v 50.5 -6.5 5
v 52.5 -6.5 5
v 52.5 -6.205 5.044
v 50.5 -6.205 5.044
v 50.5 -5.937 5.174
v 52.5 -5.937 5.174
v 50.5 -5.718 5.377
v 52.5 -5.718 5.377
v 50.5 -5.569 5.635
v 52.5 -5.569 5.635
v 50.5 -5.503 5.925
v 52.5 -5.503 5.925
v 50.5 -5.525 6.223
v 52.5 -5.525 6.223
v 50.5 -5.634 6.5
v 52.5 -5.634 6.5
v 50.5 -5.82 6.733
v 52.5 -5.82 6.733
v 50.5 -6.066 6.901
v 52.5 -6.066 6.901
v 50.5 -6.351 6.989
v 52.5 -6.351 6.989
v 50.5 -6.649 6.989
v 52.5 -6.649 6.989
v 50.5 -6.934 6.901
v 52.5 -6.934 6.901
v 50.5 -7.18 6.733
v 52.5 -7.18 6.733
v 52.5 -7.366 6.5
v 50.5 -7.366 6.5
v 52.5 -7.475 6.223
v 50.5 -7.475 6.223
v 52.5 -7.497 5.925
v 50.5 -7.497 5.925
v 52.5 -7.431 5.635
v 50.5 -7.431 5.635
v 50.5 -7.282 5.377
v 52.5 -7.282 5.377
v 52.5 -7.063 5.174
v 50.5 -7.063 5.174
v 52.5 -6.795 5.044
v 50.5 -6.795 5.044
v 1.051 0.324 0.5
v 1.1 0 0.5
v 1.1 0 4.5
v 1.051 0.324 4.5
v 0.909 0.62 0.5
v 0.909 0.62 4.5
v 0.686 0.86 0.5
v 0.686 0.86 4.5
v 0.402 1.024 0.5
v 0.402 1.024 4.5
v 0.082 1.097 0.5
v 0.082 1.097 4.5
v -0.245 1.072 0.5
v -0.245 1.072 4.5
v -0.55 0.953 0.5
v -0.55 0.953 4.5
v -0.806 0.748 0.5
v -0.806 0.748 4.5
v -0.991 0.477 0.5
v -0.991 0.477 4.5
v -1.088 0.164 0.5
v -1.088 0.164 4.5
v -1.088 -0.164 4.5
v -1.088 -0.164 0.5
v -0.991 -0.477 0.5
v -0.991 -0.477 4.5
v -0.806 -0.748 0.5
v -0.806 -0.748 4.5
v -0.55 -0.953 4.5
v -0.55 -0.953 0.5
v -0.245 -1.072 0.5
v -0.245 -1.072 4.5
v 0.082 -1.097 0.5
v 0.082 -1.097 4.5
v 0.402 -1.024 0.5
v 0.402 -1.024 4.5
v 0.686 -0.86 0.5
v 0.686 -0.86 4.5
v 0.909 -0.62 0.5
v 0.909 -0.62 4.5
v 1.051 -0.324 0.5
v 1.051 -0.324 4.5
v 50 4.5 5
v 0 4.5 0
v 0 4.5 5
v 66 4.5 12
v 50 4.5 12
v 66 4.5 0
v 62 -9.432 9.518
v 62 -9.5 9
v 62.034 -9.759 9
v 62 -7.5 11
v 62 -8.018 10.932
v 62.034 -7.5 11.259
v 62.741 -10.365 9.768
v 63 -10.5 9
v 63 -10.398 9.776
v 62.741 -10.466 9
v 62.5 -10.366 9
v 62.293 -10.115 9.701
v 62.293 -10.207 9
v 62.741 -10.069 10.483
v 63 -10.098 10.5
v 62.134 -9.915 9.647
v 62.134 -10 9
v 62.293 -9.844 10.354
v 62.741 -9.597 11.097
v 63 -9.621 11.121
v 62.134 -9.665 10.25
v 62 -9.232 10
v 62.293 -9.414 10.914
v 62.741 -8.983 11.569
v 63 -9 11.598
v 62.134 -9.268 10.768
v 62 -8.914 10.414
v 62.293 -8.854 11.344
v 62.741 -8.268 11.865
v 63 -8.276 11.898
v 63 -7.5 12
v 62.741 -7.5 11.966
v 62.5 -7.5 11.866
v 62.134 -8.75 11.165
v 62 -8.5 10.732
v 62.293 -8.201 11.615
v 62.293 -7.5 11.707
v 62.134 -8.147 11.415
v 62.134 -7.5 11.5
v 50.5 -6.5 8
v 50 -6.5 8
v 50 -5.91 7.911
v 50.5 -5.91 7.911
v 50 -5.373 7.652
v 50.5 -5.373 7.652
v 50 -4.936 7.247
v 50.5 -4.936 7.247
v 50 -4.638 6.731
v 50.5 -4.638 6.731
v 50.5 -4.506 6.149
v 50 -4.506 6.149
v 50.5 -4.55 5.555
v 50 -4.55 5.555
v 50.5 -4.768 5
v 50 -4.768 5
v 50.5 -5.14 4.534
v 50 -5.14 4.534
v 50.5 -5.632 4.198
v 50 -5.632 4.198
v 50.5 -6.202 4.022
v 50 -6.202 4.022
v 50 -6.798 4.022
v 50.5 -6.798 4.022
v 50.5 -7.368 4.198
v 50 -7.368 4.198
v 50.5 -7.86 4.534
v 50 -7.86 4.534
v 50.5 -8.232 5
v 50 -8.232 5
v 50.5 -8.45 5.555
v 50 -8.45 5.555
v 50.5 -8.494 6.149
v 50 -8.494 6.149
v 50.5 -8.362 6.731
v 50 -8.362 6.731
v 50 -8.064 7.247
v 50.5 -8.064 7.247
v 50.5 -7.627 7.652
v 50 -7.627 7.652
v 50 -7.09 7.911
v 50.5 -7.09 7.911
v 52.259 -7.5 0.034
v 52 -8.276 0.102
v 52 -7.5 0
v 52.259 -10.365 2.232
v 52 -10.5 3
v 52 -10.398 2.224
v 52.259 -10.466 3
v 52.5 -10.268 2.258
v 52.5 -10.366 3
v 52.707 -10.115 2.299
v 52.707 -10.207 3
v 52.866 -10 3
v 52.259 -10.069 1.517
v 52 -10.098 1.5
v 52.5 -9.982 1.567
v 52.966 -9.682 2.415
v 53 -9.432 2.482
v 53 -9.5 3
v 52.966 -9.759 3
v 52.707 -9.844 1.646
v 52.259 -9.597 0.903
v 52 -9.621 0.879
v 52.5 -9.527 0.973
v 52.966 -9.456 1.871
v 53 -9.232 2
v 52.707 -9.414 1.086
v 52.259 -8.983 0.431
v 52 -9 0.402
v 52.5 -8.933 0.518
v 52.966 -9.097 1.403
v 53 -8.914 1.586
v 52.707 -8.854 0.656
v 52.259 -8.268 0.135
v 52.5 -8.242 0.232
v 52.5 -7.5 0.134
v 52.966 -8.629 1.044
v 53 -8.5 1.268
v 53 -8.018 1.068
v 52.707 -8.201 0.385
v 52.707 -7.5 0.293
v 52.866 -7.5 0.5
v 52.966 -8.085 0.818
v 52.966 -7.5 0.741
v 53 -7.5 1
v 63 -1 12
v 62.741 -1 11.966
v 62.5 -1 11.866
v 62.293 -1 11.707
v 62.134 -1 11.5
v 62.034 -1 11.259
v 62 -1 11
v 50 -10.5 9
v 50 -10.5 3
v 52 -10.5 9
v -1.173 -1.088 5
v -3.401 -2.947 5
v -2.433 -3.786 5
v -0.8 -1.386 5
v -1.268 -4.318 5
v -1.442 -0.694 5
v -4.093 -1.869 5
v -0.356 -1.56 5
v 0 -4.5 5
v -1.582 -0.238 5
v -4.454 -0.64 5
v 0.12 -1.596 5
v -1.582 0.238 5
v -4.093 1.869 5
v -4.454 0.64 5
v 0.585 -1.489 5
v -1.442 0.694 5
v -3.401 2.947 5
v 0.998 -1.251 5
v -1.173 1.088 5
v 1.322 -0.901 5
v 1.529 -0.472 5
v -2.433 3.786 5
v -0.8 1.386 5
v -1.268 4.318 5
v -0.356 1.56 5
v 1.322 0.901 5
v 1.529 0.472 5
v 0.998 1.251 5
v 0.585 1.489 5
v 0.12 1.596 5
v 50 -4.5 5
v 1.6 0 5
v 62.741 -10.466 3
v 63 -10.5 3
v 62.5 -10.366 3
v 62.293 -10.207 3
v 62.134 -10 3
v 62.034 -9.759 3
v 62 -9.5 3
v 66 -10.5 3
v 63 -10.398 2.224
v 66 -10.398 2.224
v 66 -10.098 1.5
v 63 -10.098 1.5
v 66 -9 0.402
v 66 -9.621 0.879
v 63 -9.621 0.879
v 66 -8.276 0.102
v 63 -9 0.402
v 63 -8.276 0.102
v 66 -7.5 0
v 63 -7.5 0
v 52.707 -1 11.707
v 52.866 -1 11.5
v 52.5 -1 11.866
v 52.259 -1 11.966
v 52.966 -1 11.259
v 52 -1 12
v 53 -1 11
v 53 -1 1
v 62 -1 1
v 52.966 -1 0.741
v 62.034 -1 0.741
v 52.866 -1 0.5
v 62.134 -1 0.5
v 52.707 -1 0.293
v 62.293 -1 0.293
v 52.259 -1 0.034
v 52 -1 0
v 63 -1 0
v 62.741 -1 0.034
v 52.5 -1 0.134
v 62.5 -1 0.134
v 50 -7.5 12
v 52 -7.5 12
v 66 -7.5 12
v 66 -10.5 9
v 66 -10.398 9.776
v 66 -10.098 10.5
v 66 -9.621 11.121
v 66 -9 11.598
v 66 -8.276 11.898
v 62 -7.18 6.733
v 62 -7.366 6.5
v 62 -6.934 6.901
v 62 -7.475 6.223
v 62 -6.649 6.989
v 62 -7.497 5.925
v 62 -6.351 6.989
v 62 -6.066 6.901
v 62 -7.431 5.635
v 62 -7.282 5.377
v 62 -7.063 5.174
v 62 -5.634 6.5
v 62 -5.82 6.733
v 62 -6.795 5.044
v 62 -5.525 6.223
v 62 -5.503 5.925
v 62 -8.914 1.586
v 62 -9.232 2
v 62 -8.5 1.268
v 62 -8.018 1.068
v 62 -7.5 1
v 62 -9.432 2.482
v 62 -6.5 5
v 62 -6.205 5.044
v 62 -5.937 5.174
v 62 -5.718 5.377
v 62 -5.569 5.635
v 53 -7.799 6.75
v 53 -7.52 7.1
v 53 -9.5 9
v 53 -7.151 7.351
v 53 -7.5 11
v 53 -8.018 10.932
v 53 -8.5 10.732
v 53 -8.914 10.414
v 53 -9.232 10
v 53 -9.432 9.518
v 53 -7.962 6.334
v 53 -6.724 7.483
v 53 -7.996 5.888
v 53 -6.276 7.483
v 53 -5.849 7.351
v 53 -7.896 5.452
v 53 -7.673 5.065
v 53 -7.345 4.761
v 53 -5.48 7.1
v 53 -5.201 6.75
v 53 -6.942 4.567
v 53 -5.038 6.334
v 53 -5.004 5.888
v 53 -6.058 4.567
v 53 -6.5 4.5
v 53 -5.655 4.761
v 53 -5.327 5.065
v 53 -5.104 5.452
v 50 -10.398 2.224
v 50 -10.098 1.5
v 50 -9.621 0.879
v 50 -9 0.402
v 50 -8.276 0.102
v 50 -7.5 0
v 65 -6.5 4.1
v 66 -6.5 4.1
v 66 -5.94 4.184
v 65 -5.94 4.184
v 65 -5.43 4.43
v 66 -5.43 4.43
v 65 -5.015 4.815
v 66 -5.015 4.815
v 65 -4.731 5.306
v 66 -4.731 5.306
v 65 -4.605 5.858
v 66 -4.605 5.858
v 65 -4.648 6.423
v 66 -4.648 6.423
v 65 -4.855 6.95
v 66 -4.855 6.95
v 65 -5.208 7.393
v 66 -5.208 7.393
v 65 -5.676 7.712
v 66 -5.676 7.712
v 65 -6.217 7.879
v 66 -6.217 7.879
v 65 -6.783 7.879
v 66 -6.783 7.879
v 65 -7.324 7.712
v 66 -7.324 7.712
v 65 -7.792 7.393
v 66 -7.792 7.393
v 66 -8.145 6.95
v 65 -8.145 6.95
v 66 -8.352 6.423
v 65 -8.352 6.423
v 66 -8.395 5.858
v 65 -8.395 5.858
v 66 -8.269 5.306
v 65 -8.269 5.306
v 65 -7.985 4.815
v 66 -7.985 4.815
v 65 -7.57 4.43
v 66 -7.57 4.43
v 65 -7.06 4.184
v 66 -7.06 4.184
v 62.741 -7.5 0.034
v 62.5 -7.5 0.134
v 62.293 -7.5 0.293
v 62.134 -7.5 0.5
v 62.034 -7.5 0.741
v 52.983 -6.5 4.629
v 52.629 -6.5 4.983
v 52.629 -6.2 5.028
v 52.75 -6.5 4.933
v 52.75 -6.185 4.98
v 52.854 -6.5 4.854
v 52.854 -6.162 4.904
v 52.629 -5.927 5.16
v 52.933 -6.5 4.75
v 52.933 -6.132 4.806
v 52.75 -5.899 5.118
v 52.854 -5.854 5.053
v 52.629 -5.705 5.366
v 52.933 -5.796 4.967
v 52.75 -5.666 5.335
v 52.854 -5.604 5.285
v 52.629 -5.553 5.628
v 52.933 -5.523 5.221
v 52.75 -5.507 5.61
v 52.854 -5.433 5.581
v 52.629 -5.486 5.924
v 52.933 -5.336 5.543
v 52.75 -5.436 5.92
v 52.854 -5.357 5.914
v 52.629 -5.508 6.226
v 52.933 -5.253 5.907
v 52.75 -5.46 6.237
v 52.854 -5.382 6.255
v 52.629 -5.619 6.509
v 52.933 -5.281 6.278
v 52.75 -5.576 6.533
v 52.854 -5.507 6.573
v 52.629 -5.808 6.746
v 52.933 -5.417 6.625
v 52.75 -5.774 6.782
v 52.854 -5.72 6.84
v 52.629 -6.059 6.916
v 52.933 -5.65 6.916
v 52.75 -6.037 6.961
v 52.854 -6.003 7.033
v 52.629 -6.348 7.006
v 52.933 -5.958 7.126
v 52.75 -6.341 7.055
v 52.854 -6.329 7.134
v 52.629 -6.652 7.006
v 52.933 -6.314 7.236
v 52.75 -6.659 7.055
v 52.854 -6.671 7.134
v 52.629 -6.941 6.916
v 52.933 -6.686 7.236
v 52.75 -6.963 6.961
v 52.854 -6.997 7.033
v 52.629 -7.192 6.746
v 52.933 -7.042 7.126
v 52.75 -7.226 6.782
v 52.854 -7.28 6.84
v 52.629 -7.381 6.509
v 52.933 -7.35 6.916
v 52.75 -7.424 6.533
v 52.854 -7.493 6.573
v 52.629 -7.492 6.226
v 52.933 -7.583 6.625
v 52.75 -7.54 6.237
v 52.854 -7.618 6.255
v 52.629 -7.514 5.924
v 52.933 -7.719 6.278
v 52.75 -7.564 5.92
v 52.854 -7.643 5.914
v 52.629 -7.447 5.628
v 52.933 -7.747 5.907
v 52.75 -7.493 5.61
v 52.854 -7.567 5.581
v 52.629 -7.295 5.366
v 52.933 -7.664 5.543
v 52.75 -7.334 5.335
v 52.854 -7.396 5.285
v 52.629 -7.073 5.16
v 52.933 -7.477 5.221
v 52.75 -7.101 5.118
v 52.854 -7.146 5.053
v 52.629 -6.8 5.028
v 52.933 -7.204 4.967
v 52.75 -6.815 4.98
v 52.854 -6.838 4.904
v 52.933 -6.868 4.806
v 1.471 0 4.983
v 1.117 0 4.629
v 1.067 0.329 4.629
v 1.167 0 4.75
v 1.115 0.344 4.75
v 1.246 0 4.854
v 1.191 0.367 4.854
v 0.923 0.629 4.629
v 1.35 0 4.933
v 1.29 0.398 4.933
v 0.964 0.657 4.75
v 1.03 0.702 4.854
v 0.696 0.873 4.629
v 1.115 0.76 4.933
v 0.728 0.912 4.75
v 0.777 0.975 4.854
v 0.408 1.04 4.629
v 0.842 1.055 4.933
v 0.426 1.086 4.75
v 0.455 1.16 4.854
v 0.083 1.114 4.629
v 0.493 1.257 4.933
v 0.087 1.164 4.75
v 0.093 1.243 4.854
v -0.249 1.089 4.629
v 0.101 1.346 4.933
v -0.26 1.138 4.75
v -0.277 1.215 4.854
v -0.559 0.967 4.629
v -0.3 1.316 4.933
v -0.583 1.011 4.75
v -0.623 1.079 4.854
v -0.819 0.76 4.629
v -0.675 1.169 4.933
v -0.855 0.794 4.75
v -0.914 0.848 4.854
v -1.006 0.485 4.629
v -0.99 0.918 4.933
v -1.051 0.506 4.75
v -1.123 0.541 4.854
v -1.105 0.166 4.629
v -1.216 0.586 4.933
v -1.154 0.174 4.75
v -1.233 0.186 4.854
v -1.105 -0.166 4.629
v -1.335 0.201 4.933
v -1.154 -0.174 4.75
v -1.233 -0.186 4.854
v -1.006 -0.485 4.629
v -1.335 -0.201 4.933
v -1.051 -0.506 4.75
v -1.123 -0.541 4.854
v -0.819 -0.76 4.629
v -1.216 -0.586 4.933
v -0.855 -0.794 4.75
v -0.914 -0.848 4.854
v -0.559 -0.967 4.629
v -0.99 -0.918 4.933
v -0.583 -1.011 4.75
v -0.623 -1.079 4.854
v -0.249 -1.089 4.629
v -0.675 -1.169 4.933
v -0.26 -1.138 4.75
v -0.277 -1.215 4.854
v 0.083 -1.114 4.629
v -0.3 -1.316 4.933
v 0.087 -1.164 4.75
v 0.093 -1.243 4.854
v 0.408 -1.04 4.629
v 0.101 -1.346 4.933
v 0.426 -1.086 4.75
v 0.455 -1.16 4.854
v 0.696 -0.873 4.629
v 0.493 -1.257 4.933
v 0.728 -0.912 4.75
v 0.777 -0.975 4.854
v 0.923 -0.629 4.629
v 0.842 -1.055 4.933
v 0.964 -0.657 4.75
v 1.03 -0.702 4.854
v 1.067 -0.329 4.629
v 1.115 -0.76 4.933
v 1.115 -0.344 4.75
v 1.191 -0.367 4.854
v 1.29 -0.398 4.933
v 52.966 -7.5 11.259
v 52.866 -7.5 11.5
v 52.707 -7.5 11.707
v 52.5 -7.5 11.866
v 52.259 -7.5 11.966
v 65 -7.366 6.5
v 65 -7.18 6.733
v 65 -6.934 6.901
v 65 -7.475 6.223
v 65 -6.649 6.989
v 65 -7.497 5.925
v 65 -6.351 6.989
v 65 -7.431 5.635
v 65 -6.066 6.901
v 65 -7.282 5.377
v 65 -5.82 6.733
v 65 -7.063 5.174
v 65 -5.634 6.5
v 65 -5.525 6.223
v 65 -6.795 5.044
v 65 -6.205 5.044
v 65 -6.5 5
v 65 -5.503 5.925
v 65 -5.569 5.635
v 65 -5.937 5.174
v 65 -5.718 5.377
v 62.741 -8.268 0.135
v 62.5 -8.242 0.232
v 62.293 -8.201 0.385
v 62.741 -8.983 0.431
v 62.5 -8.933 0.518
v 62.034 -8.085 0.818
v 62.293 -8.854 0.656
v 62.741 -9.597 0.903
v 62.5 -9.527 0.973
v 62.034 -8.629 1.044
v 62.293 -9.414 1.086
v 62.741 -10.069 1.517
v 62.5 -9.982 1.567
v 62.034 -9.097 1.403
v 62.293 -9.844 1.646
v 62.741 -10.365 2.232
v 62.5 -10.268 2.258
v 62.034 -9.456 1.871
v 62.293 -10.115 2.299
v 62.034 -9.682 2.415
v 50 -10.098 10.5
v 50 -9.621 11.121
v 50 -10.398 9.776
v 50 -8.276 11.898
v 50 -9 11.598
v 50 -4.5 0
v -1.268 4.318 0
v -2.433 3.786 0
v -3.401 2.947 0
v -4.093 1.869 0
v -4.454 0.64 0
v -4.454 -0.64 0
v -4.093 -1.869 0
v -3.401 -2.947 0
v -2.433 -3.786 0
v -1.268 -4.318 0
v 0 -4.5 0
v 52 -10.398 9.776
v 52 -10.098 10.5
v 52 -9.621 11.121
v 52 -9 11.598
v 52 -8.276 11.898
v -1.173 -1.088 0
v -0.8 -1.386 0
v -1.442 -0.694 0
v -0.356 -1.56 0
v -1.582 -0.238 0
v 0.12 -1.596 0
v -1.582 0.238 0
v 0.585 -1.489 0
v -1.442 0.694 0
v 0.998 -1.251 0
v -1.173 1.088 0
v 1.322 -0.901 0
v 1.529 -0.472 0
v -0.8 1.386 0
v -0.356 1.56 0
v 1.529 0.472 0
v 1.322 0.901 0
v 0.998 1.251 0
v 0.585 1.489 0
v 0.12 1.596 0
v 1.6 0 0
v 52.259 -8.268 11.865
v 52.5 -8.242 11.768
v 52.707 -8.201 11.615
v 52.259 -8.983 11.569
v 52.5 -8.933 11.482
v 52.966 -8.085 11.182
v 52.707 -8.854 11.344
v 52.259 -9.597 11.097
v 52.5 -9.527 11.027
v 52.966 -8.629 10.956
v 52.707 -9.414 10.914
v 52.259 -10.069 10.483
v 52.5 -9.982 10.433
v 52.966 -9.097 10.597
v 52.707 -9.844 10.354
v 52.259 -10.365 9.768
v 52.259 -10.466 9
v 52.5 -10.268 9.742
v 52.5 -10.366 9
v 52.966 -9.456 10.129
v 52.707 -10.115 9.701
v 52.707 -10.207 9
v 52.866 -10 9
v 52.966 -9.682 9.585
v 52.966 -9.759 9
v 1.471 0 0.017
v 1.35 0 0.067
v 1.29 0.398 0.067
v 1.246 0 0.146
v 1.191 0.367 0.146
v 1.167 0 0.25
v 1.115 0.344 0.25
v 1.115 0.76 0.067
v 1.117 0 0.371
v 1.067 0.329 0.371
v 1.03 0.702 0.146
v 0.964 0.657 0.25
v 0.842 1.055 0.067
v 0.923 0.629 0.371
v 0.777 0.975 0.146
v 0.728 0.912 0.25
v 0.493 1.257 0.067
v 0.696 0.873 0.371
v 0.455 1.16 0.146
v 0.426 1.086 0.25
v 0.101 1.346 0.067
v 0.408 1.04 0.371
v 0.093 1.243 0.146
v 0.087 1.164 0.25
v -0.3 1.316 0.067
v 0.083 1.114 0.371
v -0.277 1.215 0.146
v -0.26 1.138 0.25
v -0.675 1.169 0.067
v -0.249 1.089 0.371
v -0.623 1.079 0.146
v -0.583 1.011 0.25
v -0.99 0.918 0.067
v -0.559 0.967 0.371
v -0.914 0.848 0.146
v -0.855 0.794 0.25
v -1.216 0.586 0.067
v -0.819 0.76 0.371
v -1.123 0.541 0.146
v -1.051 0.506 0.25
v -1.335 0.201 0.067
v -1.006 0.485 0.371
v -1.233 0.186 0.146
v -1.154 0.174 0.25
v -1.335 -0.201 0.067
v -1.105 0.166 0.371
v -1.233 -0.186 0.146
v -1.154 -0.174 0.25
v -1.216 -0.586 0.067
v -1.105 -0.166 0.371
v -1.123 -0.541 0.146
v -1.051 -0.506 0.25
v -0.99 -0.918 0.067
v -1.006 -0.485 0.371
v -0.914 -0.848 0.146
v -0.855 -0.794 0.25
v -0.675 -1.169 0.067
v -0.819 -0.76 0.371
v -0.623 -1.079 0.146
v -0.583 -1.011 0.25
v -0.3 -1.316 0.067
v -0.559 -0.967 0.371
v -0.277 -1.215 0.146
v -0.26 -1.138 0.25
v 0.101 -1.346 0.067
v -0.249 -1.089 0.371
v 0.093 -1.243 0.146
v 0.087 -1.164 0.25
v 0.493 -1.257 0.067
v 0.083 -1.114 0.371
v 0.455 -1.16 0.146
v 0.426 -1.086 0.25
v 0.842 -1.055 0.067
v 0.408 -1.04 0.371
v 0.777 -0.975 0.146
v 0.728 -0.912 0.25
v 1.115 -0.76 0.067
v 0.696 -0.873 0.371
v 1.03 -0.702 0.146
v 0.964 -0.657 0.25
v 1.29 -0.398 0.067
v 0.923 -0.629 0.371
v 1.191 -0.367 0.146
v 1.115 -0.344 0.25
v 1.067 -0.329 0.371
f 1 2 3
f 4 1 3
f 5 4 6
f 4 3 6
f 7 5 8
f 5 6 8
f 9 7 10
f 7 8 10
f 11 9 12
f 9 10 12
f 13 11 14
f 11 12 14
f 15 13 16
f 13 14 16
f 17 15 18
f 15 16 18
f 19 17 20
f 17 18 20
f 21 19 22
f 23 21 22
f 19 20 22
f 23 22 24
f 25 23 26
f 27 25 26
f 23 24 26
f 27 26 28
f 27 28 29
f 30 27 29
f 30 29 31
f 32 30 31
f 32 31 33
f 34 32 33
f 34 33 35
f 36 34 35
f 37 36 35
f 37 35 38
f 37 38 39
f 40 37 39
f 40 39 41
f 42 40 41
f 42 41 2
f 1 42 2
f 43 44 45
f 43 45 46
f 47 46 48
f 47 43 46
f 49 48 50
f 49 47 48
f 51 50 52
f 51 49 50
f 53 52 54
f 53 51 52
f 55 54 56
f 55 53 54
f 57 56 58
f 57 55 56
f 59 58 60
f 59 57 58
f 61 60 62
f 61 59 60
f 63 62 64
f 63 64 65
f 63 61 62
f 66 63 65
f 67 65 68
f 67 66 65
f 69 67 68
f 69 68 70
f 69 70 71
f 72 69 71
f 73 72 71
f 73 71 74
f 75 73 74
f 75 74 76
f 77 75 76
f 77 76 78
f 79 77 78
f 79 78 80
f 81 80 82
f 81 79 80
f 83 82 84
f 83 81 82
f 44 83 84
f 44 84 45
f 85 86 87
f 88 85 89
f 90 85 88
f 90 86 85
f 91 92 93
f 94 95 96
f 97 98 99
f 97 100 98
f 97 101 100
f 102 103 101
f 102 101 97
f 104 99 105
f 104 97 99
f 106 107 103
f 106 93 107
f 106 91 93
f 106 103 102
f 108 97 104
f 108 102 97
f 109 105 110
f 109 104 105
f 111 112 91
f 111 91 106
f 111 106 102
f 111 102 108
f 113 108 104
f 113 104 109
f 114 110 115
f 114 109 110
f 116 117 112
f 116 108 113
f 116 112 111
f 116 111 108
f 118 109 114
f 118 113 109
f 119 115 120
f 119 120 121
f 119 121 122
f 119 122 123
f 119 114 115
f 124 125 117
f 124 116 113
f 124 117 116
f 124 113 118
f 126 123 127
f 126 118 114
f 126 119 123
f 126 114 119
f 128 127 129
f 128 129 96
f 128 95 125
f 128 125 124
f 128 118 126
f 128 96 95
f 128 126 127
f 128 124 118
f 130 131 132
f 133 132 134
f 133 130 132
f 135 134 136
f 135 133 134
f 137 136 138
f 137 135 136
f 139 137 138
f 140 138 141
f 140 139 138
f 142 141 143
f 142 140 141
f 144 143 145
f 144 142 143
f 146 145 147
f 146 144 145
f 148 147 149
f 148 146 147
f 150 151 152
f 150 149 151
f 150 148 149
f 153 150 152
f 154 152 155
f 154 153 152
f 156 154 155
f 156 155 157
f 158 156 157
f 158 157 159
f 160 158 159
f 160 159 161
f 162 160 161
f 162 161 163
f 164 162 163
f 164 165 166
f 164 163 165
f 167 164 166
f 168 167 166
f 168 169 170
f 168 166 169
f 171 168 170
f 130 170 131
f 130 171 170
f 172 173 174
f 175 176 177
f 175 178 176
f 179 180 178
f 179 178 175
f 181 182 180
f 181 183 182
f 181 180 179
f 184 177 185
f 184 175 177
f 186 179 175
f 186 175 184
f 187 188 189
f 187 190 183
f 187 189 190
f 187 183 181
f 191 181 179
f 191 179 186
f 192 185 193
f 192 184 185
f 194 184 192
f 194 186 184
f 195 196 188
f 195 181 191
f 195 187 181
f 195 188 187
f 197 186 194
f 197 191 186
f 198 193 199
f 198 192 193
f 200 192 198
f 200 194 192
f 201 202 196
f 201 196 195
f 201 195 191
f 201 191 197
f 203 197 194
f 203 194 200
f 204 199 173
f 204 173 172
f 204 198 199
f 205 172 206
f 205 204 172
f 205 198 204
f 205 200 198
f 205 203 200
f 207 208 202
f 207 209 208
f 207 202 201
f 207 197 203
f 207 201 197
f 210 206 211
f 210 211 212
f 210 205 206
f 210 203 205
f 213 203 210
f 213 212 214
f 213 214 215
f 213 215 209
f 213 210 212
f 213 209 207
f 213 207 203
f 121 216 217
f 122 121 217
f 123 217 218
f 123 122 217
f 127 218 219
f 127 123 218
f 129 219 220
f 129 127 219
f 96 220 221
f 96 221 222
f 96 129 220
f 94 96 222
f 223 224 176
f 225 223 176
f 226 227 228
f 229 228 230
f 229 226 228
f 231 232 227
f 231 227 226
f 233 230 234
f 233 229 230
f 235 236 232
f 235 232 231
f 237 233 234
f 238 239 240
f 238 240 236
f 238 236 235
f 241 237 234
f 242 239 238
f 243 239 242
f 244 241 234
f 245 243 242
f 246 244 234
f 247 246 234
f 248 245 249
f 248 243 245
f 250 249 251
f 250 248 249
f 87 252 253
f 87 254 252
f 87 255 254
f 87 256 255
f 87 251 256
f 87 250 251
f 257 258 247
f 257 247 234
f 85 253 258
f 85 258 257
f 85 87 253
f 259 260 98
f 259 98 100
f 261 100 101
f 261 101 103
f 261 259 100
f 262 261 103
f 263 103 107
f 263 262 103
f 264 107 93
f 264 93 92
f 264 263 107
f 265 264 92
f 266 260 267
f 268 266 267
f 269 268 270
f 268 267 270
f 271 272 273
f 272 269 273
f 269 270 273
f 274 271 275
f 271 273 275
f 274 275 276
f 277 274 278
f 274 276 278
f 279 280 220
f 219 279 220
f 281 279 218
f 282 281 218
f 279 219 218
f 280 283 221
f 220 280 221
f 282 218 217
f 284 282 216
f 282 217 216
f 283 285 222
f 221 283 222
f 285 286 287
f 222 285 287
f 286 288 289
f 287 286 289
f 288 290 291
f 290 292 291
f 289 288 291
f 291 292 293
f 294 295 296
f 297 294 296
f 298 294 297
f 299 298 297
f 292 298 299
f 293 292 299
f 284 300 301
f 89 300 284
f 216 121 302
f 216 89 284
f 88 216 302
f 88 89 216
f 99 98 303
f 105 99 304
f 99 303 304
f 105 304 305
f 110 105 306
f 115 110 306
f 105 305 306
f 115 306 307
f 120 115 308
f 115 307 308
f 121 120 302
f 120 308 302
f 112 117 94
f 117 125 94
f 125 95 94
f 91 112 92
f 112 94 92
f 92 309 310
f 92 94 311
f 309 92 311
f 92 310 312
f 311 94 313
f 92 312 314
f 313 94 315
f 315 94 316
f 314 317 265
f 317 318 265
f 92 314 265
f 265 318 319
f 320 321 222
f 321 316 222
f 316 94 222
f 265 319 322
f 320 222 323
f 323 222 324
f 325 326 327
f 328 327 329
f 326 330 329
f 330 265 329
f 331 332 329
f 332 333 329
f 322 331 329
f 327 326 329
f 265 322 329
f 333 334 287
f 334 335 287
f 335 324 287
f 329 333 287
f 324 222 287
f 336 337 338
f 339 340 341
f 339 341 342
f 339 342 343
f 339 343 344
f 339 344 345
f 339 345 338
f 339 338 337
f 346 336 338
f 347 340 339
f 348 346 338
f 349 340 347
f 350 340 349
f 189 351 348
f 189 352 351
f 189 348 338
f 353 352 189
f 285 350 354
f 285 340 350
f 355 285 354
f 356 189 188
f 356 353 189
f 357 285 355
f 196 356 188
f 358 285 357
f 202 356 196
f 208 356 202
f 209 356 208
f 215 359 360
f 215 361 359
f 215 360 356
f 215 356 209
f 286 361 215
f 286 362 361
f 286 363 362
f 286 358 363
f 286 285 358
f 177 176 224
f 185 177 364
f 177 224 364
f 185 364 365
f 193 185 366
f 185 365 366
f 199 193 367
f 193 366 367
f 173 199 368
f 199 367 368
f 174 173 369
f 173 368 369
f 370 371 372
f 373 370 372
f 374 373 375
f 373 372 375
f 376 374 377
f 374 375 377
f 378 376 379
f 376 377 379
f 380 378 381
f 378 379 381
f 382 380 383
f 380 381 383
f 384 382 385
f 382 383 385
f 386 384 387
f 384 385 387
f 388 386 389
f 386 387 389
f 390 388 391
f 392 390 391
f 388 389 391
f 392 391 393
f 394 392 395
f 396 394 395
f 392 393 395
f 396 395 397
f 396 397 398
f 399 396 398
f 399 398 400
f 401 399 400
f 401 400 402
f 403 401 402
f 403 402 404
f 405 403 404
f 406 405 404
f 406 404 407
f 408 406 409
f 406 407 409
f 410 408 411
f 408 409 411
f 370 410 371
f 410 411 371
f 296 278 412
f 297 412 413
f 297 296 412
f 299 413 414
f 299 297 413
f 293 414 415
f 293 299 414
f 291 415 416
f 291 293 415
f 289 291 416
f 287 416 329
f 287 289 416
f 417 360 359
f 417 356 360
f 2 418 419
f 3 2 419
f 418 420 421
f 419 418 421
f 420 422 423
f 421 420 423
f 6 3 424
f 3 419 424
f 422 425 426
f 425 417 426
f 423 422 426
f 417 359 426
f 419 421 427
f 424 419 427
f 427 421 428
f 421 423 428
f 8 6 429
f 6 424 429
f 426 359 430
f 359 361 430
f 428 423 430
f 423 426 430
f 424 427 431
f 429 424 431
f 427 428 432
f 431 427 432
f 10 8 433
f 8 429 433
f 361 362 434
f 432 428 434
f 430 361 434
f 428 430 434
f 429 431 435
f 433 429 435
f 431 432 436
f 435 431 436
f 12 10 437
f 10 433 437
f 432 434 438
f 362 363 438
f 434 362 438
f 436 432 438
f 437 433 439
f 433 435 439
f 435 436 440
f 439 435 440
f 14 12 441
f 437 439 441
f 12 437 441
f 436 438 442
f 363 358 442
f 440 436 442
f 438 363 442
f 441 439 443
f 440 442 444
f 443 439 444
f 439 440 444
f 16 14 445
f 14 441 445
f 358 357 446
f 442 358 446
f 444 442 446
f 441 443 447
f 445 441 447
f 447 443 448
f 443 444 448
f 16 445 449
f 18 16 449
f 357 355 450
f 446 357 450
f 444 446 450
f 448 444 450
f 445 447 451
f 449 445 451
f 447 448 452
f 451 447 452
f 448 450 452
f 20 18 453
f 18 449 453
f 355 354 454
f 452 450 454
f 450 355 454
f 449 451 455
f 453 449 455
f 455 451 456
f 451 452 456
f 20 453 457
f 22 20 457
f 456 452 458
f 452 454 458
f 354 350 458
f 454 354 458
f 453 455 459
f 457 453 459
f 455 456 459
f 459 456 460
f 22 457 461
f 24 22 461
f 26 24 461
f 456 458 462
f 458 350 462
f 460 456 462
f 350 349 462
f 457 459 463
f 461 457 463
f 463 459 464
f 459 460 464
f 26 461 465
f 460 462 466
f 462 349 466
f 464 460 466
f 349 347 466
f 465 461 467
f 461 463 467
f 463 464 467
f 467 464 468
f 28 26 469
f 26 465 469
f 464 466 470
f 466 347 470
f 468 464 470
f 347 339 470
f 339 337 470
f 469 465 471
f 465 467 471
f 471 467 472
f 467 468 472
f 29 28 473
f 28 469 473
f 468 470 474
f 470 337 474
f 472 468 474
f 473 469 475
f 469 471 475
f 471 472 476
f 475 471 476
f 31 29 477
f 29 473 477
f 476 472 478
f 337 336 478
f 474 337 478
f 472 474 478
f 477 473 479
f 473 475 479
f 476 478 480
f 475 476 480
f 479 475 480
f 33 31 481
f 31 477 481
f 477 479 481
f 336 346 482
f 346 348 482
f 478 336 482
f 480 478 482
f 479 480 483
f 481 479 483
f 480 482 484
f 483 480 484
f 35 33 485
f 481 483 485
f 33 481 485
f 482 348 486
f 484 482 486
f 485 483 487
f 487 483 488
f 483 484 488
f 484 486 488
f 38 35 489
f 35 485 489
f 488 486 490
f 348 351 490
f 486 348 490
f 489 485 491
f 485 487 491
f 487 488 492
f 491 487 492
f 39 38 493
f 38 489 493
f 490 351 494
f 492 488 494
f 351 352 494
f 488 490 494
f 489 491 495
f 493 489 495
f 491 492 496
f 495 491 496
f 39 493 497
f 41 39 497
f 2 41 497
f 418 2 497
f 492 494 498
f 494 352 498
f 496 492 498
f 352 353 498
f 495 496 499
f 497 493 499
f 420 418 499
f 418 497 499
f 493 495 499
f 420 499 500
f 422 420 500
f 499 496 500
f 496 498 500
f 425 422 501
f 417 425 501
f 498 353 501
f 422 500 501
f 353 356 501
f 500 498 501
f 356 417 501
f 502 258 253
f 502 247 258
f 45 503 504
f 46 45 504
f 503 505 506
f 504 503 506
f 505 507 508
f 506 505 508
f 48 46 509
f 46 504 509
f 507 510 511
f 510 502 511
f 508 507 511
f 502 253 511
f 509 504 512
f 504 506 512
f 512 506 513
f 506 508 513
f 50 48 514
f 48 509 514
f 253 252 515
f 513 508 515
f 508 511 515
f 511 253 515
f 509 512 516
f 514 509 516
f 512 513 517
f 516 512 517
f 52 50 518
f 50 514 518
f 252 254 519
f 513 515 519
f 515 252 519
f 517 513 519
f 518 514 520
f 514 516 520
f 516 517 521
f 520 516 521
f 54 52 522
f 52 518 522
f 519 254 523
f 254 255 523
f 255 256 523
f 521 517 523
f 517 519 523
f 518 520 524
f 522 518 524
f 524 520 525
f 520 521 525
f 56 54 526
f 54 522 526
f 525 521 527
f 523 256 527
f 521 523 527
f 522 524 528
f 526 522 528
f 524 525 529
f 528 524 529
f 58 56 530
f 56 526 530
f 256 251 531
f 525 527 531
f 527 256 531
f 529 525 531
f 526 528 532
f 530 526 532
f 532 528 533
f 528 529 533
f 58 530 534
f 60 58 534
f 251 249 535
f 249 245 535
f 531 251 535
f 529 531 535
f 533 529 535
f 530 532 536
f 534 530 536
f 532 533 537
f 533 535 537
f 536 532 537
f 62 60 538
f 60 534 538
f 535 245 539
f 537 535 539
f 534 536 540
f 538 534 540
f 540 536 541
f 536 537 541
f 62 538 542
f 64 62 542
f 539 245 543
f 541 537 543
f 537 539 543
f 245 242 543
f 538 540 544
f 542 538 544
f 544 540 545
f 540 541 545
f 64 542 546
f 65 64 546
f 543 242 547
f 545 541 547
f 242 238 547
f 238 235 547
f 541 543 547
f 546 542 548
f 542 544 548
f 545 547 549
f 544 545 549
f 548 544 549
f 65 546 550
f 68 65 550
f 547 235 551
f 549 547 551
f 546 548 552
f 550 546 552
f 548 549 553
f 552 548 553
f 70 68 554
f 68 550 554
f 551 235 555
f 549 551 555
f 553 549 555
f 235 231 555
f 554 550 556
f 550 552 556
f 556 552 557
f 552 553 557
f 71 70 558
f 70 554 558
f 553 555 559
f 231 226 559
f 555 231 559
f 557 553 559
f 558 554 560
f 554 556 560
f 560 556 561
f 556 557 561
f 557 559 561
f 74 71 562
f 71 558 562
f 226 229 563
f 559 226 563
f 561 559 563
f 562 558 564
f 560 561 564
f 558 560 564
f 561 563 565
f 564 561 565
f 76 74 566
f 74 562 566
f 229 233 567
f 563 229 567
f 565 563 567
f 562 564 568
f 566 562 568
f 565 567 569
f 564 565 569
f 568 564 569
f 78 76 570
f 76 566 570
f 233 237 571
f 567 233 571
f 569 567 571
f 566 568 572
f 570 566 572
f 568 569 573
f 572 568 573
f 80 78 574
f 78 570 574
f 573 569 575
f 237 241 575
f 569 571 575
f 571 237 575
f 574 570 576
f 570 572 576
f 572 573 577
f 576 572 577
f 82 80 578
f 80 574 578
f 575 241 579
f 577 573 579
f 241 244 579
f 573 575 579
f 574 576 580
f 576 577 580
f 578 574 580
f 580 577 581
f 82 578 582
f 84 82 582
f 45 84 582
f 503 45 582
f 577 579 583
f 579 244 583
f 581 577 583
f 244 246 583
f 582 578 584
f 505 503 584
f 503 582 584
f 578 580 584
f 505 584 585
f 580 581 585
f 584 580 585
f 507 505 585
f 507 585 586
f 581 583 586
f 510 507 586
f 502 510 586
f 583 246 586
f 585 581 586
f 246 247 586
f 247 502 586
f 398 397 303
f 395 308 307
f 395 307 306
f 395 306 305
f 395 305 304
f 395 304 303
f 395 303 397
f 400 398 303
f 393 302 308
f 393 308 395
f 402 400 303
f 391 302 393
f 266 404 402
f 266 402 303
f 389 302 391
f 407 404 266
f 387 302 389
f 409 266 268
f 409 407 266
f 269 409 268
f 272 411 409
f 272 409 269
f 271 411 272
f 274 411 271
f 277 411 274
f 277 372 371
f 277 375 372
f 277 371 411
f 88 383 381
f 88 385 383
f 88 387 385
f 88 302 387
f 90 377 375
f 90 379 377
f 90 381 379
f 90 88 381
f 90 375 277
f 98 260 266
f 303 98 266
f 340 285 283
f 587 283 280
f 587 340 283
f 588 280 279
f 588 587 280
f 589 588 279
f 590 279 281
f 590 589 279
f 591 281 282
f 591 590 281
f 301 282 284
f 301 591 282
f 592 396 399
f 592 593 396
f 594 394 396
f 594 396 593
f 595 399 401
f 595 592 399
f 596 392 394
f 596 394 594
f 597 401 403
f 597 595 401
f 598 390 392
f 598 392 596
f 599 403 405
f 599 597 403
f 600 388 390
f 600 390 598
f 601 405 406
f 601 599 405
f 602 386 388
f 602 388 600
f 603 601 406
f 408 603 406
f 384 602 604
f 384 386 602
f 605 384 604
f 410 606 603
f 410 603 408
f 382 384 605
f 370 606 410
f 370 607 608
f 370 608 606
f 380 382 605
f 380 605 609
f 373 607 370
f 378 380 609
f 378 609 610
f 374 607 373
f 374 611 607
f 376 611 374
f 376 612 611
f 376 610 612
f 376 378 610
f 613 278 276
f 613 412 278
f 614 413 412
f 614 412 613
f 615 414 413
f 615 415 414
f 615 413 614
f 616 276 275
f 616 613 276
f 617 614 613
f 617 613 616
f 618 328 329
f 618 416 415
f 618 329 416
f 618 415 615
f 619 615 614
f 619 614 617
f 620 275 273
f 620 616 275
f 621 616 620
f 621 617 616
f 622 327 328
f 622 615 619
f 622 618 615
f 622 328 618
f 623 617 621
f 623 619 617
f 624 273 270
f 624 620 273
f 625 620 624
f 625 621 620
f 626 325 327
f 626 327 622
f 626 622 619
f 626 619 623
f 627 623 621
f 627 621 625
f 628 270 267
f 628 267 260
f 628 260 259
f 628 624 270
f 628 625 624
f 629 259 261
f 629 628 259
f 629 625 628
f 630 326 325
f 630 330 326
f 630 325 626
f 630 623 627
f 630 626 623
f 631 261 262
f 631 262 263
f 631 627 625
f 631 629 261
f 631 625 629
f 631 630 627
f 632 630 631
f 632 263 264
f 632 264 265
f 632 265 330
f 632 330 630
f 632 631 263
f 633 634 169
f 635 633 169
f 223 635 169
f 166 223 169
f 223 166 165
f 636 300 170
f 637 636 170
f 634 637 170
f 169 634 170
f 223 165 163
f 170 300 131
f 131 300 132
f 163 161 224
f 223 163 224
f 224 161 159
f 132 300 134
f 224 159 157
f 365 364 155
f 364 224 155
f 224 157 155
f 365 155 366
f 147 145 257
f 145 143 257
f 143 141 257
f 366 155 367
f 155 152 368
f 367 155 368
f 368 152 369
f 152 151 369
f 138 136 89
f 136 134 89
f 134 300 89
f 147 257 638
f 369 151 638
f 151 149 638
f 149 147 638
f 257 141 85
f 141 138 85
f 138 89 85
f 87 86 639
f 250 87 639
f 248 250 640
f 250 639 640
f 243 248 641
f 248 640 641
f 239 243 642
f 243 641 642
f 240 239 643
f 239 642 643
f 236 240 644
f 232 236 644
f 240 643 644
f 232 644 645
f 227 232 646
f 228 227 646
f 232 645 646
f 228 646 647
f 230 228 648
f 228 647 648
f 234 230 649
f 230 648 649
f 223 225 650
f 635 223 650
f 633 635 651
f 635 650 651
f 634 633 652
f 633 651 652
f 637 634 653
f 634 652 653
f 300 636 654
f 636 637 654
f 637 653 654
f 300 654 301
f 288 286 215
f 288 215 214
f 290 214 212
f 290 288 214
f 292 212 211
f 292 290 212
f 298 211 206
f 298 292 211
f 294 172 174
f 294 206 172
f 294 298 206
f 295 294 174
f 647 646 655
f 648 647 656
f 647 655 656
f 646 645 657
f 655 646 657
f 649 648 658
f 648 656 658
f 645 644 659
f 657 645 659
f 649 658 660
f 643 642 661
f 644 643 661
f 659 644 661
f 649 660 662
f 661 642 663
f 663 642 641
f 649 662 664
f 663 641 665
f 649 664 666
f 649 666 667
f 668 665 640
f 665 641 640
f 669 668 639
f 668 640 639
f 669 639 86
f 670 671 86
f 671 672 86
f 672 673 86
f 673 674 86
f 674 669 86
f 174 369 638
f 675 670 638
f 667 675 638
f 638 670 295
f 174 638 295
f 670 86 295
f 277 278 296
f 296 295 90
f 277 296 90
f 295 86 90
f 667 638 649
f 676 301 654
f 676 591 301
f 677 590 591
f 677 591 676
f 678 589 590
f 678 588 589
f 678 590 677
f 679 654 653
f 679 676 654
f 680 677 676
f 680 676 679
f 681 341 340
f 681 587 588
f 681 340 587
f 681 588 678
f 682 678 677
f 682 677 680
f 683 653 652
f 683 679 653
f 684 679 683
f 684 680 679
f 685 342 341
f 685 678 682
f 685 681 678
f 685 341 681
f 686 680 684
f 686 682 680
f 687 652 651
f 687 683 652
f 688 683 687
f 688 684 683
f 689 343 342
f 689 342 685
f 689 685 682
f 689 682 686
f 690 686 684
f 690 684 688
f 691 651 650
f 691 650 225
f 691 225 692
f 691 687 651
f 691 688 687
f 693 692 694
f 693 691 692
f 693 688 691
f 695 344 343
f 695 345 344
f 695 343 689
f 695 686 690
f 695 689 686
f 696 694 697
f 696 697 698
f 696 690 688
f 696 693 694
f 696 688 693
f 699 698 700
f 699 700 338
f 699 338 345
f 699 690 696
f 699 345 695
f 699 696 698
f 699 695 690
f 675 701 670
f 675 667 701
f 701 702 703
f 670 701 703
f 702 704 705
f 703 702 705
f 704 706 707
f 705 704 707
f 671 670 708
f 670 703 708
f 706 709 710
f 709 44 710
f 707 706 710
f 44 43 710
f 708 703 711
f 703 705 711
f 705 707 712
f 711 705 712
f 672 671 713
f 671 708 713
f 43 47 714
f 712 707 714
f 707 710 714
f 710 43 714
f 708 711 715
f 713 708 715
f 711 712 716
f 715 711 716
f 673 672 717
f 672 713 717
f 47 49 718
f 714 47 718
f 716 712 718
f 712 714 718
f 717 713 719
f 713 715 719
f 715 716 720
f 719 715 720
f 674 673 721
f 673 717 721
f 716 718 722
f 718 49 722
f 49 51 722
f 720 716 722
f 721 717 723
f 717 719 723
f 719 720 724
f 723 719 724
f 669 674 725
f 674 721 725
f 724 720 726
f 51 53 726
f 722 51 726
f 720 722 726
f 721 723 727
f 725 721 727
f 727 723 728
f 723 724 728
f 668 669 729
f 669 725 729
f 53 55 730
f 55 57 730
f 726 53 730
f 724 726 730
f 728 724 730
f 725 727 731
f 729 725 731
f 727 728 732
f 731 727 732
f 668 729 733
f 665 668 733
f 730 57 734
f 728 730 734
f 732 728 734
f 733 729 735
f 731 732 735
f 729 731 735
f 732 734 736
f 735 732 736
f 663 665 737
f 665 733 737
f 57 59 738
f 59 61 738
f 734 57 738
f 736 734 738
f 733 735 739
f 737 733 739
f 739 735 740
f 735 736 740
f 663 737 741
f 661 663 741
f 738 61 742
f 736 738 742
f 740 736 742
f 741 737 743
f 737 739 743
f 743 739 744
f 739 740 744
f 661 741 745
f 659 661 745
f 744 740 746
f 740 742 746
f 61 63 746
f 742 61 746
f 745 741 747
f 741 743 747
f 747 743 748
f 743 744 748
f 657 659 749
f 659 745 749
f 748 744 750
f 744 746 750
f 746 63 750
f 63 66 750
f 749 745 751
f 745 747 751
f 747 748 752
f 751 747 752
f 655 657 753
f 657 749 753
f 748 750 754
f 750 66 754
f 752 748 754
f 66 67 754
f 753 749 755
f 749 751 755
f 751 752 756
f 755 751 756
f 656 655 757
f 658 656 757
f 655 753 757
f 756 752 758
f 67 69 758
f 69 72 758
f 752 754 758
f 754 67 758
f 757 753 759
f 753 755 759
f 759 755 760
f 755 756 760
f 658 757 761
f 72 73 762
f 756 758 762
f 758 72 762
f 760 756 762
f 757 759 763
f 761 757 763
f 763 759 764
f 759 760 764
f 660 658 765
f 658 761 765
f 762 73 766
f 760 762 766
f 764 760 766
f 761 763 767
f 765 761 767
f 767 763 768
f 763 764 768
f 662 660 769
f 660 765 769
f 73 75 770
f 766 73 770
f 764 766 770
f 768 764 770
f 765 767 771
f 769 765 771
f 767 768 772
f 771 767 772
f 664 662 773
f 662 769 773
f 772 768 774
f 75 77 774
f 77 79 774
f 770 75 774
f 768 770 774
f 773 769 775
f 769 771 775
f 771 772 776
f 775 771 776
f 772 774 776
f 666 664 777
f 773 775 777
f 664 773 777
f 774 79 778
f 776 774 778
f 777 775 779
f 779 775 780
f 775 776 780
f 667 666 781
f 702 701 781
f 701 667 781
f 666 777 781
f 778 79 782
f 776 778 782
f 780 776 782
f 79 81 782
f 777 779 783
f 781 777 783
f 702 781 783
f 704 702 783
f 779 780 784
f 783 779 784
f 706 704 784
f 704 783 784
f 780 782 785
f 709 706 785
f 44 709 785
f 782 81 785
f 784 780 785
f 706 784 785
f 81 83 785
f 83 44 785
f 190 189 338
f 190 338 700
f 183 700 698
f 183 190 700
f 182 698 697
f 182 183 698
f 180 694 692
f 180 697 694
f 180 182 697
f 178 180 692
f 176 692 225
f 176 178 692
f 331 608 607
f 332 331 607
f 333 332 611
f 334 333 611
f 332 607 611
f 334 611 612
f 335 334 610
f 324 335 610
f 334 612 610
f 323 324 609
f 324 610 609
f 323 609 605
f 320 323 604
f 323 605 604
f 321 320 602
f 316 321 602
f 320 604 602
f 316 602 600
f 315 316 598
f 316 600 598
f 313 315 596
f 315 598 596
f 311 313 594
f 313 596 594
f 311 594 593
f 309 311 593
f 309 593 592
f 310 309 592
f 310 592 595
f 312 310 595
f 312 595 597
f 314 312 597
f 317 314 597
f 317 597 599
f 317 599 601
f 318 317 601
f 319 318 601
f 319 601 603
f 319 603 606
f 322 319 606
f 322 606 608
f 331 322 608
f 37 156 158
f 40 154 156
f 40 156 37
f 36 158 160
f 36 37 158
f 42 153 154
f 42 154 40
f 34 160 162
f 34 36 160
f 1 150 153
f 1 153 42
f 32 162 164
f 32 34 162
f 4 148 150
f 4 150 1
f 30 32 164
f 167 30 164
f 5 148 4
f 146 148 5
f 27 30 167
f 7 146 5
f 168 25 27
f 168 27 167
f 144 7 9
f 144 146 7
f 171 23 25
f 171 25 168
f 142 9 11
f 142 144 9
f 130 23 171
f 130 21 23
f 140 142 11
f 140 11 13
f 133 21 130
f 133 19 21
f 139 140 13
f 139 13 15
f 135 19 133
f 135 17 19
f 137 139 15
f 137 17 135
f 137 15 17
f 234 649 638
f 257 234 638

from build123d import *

# Parameters (mm, degrees)
SKETCH1_R           = 1.1
BOSS_EXTRUDE1_DEPTH = 5
SKETCH2_W           = 16
SKETCH2_H           = 12
BOSS_EXTRUDE2_DEPTH = 15
CUT_EXTRUDE1_START  = -5.5
SKETCH3_W           = 9
SKETCH3_H           = 15.5
CUT_EXTRUDE1_DEPTH  = 9.5
SKETCH4_R           = 1
CUT_EXTRUDE2_DEPTH  = 16
FILLET2_R           = 0.5
SKETCH5_R           = 1.9
CUT_EXTRUDE3_DEPTH  = 1
FILLET3_R           = 1
CUT_EXTRUDE4_START  = -0.5
SKETCH6_R           = 2
CUT_EXTRUDE4_DEPTH  = 5.5
FILLET4_R           = 3
FILLET5_R           = 0.5


with BuildPart() as part:
    # Sketch1 → Boss-Extrude1 (new body)
    with BuildSketch(Plane.XY):
        with BuildLine():
            ThreePointArc((0, 4.5), (-4.5, 0), (0, -4.5))
            Line((0, -4.5), (50, -4.5))
            Line((50, -4.5), (50, 4.5))
            Line((50, 4.5), (0, 4.5))
        make_face()
        Circle(SKETCH1_R, mode=Mode.SUBTRACT)
    extrude(amount=BOSS_EXTRUDE1_DEPTH)

    # Sketch2 → Boss-Extrude2 (add)
    with BuildSketch(Plane(origin=(0, 4.5, 0), x_dir=(1, 0, 0), z_dir=(0, 1, 0))):
        with Locations((58, -6)):
            Rectangle(SKETCH2_W, SKETCH2_H)
    extrude(amount=-BOSS_EXTRUDE2_DEPTH)

    # Sketch3 → Cut-Extrude1 (cut)
    with BuildSketch(Plane(origin=(0, 4.5, 0), x_dir=(1, 0, 0), z_dir=(0, 1, 0)).offset(CUT_EXTRUDE1_START)):
        with Locations((57.5, -4.25)):
            Rectangle(SKETCH3_W, SKETCH3_H)
    extrude(amount=-CUT_EXTRUDE1_DEPTH, mode=Mode.SUBTRACT)

    # Sketch4 → Cut-Extrude2 (cut)
    with BuildSketch(Plane(origin=(66, 0, 0), x_dir=(0, 0, -1), z_dir=(1, 0, 0))):
        with Locations((-6, -6.5)):
            Circle(SKETCH4_R)
    extrude(amount=-CUT_EXTRUDE2_DEPTH, mode=Mode.SUBTRACT)

    # Fillet2
    fillet2_edges = [part.edges().sort_by_distance(p)[0] for p in [
        (53, -6.5, 7),
    ]]
    fillet(fillet2_edges, radius=FILLET2_R)

    # Sketch5 → Cut-Extrude3 (cut)
    with BuildSketch(Plane(origin=(66, 0, 0), x_dir=(0, 0, -1), z_dir=(1, 0, 0))):
        with Locations((-6, -6.5)):
            Circle(SKETCH5_R)
    extrude(amount=-CUT_EXTRUDE3_DEPTH, mode=Mode.SUBTRACT)

    # Fillet3
    fillet3_edges = [part.edges().sort_by_distance(p)[0] for p in [
        (53, -10.5, 6),
        (62, -10.5, 6),
        (62, -5.75, 0),
        (53, -5.75, 0),
        (53, -5.75, 12),
        (62, -5.75, 12),
    ]]
    fillet(fillet3_edges, radius=FILLET3_R)

    # Sketch6 → Cut-Extrude4 (cut)
    with BuildSketch(Plane.ZY.offset(-50).offset(CUT_EXTRUDE4_START)):
        with Locations((6, -6.5)):
            Circle(SKETCH6_R)
    extrude(amount=CUT_EXTRUDE4_DEPTH, mode=Mode.SUBTRACT)

    # Fillet4
    # the kernel refuses this fillet: 3 mm, written as the material it takes off along each edge
    with BuildSketch(Plane(origin=(53, -7.5, 3), x_dir=(0, -1, 0), z_dir=(0, 0, 1))) as fillet4_piece_1:
        with BuildLine():
            CenterArc((2, -1), 1, 0, 90)
            Line((3, -1), (3, 0))
            Line((3, 0), (2, 0))
        make_face()
    revolve(axis=Axis((53, -7.5, 3), (1, 0, 0)), revolution_arc=90, mode=Mode.SUBTRACT)
    with BuildSketch(Plane(origin=(53, -7.5, 9), x_dir=(0, 0, 1), z_dir=(0, 1, 0))) as fillet4_piece_2:
        with BuildLine():
            CenterArc((2, -1), 1, 0, 90)
            Line((3, -1), (3, 0))
            Line((3, 0), (2, 0))
        make_face()
    revolve(axis=Axis((53, -7.5, 9), (1, 0, 0)), revolution_arc=90, mode=Mode.SUBTRACT)
    with BuildSketch(Plane(origin=(62, -7.5, 9), x_dir=(0, -1, 0), z_dir=(0, 0, -1))) as fillet4_piece_3:
        with BuildLine():
            CenterArc((2, -1), 1, 0, 90)
            Line((3, -1), (3, 0))
            Line((3, 0), (2, 0))
        make_face()
    revolve(axis=Axis((62, -7.5, 9), (-1, 0, 0)), revolution_arc=90, mode=Mode.SUBTRACT)
    with BuildSketch(Plane(origin=(62, -7.5, 3), x_dir=(0, 0, -1), z_dir=(0, 1, 0))) as fillet4_piece_4:
        with BuildLine():
            CenterArc((2, -1), 1, 0, 90)
            Line((3, -1), (3, 0))
            Line((3, 0), (2, 0))
        make_face()
    revolve(axis=Axis((62, -7.5, 3), (-1, 0, 0)), revolution_arc=90, mode=Mode.SUBTRACT)
    with BuildSketch(Plane(origin=(62, -10.5, 0), x_dir=(0, 1, 0), z_dir=(1, 0, 0)), Plane(origin=(73.5, -10.5, 12), x_dir=(0, 1, 0), z_dir=(-1, 0, 0))) as fillet4_piece_5:
        with BuildLine():
            CenterArc((FILLET4_R, FILLET4_R), FILLET4_R, 180, 90)
            Line((0, FILLET4_R), (0, 0))
            Line((0, 0), (FILLET4_R, 0))
        make_face()
    extrude(amount=11.5, mode=Mode.SUBTRACT)
    with BuildSketch(Plane(origin=(53, -10.5, 12), x_dir=(0, 1, 0), z_dir=(-1, 0, 0)), Plane(origin=(42.5, -10.5, 0), x_dir=(0, 1, 0), z_dir=(1, 0, 0))) as fillet4_piece_6:
        with BuildLine():
            CenterArc((FILLET4_R, FILLET4_R), FILLET4_R, 180, 90)
            Line((0, FILLET4_R), (0, 0))
            Line((0, 0), (FILLET4_R, 0))
        make_face()
    extrude(amount=10.5, mode=Mode.SUBTRACT)

    # Fillet5
    fillet5_edges = [part.edges().sort_by_distance(p)[0] for p in [
        (-1.1, 0, 5),
        (-1.1, 0, 0),
    ]]
    fillet(fillet5_edges, radius=FILLET5_R)


solid = part.part
